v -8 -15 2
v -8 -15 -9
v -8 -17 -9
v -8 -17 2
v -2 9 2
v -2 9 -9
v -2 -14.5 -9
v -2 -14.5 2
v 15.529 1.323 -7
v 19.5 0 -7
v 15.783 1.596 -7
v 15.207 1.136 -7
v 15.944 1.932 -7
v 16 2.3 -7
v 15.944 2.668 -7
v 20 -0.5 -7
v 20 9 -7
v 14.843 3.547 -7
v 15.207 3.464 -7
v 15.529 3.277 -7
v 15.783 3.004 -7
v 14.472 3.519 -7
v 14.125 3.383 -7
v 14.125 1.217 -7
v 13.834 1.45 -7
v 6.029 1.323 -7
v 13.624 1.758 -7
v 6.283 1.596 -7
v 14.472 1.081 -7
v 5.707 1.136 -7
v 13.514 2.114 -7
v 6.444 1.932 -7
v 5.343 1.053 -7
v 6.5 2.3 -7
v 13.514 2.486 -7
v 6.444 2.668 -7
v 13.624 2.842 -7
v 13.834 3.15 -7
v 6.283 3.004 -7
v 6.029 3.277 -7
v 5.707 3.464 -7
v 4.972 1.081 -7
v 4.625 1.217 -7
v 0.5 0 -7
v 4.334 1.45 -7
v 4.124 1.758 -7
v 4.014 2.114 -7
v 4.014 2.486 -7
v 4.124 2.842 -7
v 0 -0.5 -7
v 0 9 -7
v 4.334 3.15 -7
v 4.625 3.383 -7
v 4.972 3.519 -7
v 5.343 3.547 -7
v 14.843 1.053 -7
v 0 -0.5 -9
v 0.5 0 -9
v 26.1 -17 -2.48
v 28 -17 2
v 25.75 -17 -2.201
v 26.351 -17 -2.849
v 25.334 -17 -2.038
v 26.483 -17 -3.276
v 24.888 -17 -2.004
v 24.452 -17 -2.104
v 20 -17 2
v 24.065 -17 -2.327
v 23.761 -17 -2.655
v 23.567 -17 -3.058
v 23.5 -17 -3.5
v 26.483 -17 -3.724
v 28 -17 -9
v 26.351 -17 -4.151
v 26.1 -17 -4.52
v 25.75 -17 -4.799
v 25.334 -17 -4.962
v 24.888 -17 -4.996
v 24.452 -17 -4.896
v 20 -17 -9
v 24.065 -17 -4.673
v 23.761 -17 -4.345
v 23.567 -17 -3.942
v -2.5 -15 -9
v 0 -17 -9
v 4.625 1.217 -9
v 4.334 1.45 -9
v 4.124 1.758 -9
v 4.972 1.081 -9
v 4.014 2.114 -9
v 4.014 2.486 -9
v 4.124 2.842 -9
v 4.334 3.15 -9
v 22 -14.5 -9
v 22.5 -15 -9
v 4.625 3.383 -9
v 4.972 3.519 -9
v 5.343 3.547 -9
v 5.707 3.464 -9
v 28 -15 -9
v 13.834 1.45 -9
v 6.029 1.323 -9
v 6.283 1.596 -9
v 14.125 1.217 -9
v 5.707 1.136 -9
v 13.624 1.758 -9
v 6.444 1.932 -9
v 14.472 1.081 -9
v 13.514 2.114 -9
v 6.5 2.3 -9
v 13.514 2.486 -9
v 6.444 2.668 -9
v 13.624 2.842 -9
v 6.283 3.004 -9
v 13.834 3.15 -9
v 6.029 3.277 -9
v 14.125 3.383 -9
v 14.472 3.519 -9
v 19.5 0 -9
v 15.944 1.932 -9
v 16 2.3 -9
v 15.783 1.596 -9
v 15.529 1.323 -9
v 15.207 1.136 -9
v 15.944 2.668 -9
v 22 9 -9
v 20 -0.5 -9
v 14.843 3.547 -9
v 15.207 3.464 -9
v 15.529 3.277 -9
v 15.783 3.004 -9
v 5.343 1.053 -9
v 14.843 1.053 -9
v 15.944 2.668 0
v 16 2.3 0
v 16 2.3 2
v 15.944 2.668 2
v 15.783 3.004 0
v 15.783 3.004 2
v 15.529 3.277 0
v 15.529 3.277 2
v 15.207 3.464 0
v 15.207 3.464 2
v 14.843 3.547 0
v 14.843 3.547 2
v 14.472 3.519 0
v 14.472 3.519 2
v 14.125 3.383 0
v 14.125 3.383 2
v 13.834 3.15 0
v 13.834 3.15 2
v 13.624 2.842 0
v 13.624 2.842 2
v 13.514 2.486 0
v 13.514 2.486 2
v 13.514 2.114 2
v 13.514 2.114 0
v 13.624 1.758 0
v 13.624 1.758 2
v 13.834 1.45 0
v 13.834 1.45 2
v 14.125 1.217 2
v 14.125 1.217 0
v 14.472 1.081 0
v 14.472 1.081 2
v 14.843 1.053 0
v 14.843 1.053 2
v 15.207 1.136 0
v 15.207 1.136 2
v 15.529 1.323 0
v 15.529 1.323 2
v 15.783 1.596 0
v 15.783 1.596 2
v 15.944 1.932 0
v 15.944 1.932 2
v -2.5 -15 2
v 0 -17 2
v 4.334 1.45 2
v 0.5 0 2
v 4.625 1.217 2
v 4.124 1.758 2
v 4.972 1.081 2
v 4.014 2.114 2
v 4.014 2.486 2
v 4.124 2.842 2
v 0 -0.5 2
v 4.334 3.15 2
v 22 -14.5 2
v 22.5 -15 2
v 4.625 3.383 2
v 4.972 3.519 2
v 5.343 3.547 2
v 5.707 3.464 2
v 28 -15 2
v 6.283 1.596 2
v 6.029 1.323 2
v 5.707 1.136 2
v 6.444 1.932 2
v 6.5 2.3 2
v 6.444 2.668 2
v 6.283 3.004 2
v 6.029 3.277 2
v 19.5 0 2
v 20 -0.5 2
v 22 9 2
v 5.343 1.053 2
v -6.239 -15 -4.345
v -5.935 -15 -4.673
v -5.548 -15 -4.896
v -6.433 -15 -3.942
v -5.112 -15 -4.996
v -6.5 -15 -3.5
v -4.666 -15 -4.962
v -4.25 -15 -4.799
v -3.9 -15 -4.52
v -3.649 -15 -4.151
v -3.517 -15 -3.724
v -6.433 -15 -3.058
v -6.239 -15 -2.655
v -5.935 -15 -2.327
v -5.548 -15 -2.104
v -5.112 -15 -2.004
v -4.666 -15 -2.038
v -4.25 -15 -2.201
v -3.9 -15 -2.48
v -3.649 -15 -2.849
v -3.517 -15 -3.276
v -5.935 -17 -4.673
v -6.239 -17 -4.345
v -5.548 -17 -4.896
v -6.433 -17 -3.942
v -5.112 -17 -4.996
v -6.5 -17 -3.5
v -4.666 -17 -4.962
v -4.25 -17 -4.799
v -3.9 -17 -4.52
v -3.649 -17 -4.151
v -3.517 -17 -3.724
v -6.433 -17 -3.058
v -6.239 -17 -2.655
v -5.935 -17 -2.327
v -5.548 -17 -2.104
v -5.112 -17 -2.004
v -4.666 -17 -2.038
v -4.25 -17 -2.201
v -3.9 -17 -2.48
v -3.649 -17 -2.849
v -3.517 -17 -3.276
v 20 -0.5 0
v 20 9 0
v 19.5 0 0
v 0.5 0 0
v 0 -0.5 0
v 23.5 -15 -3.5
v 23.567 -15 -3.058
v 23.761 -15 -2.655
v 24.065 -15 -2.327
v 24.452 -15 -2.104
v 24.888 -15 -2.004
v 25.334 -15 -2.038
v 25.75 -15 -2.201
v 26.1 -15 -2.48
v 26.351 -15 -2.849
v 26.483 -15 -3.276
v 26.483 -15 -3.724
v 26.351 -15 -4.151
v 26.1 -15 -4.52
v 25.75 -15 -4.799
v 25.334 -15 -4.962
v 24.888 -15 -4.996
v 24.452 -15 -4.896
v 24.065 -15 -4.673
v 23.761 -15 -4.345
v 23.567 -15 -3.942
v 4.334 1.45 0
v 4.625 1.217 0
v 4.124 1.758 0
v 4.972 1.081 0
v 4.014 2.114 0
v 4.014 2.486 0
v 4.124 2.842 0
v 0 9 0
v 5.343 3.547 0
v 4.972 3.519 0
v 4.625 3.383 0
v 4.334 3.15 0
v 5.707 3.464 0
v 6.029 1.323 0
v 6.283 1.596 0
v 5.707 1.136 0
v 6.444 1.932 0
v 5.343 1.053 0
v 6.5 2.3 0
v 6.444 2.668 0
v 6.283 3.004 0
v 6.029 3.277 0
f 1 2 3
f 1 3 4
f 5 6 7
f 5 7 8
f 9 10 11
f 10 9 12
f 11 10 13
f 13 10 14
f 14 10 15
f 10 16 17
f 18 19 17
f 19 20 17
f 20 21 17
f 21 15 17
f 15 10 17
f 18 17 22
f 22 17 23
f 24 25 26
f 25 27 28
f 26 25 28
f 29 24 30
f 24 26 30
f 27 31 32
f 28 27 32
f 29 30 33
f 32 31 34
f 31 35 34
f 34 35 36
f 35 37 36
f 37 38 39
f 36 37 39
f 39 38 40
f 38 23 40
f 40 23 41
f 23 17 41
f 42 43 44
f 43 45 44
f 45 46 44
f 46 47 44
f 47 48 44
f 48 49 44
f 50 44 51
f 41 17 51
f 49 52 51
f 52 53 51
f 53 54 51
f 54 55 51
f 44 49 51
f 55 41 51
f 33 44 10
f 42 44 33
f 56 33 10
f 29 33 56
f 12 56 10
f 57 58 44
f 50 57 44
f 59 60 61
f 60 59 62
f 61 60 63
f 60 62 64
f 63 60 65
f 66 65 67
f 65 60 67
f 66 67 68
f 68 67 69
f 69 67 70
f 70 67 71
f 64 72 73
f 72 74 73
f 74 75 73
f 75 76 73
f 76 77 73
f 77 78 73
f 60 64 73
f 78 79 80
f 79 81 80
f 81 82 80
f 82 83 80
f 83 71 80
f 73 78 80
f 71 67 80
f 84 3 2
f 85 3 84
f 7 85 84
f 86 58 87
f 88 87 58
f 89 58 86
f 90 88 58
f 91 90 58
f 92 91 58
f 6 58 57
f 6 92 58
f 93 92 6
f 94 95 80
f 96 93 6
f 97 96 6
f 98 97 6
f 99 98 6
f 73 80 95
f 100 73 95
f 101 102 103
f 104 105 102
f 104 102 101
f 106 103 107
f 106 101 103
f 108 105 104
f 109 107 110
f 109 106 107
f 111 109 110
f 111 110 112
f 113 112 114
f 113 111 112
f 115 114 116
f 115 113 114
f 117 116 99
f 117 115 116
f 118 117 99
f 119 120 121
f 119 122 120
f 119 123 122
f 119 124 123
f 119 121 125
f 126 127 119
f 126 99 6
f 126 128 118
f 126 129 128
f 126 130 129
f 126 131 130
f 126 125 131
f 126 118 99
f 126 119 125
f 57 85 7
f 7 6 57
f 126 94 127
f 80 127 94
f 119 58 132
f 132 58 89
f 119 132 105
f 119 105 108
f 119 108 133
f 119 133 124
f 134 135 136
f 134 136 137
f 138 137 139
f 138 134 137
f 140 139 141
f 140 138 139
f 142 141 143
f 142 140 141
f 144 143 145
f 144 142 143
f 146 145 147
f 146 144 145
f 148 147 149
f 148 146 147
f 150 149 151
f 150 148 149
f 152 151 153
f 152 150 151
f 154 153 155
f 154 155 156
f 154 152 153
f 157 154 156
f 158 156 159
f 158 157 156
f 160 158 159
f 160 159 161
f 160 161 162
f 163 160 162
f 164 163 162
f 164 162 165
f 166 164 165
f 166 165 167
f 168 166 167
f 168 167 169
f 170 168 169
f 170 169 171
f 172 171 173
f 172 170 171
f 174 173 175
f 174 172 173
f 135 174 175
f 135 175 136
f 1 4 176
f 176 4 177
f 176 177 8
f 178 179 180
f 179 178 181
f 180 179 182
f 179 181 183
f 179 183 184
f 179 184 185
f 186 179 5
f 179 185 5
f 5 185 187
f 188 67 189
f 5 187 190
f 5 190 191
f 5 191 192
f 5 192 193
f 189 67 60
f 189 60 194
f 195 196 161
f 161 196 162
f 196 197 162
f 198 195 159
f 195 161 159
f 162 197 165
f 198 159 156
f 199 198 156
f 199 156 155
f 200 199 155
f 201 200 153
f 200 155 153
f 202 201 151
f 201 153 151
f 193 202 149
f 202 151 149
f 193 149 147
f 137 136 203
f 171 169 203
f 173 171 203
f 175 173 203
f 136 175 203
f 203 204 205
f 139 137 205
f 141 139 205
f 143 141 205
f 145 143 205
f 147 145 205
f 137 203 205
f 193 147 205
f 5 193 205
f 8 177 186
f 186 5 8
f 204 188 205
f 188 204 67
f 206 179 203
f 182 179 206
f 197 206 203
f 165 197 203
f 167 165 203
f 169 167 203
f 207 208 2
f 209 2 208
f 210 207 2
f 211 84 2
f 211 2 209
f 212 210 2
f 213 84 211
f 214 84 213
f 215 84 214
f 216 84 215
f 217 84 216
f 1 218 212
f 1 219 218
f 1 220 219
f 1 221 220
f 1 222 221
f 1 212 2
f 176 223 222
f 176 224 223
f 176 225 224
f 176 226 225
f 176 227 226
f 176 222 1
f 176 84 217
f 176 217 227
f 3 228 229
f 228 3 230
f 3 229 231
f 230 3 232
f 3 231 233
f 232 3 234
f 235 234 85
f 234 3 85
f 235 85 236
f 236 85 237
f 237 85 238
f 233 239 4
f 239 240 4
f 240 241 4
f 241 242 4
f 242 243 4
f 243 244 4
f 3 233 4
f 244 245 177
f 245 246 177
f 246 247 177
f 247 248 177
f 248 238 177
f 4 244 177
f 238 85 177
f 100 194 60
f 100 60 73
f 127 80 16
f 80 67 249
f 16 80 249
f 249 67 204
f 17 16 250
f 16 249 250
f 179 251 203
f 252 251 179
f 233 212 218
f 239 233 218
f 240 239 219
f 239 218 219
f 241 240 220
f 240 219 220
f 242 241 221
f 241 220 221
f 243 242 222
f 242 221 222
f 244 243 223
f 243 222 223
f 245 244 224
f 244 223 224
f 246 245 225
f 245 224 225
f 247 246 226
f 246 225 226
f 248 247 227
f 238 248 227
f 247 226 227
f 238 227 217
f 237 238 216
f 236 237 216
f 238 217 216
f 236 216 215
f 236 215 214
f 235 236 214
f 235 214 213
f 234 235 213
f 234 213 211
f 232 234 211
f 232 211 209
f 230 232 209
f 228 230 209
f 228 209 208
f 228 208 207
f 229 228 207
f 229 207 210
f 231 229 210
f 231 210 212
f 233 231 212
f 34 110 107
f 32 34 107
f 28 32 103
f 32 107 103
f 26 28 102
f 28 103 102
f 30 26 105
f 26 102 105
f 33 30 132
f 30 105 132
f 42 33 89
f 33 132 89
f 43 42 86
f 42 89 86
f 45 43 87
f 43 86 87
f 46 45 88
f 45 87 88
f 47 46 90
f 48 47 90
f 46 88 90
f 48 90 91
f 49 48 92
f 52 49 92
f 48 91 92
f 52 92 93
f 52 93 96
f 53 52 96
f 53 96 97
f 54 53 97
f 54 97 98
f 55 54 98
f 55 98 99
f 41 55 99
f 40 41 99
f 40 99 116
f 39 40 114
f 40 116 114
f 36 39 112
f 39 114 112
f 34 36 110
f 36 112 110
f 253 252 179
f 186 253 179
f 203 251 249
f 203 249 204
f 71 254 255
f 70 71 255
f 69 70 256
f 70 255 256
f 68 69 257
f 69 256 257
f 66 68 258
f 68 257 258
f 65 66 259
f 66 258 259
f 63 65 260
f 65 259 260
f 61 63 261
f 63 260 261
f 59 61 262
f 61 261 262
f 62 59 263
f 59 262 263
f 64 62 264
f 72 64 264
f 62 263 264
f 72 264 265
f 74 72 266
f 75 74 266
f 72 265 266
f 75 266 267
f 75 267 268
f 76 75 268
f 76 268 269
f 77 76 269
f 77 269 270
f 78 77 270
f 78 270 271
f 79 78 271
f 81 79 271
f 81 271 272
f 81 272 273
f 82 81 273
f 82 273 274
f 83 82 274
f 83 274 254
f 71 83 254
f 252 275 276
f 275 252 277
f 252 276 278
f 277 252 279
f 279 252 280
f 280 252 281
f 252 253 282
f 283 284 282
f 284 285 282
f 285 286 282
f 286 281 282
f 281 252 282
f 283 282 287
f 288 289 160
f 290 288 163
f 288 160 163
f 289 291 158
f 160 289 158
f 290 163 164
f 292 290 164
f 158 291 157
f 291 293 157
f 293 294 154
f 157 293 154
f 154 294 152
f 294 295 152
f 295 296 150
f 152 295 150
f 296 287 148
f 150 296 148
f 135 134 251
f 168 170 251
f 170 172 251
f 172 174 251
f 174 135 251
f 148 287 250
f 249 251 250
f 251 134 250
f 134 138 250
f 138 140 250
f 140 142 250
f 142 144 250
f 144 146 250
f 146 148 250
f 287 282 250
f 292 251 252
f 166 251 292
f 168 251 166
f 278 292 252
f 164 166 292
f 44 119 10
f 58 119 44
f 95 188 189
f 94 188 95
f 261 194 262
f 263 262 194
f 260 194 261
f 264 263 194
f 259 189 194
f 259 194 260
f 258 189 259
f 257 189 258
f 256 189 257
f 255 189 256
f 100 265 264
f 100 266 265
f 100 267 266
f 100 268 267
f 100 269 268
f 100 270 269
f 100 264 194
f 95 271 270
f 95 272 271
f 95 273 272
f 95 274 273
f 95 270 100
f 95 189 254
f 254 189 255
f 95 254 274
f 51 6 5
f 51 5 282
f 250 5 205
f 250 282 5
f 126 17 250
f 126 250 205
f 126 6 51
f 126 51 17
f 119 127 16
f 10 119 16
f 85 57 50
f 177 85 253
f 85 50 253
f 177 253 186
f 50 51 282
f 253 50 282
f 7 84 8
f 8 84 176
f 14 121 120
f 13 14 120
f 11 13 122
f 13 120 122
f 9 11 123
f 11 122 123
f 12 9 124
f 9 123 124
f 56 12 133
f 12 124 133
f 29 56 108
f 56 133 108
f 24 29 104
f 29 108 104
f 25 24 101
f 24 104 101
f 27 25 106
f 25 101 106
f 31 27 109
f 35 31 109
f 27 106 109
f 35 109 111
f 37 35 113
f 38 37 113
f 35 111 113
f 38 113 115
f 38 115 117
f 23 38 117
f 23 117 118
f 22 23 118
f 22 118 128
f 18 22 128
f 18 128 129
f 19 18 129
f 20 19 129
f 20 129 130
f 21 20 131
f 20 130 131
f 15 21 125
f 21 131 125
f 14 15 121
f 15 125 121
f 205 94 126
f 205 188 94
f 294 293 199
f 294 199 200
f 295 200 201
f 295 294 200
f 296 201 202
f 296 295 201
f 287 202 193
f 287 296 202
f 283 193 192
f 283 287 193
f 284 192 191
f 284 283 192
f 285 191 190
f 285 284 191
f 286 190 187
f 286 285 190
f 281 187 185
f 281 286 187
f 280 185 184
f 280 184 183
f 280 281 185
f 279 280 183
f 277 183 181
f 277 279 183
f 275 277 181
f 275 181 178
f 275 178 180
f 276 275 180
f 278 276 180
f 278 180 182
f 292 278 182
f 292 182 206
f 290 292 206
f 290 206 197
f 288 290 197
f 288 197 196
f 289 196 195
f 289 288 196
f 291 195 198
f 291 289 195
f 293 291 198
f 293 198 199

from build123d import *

# Parameters (mm, degrees)
CROQUIS1_W              = 20
CROQUIS1_H              = 10
CROQUIS1_R              = 1.25
SALIENTE_EXTRUIR1_DEPTH = 2
CROQUIS2_W              = 2
CROQUIS2_H              = 10
SALIENTE_EXTRUIR2_DEPTH = 11
CROQUIS3_W              = 20
CROQUIS3_H              = 10
CROQUIS3_R              = 1.25
SALIENTE_EXTRUIR3_DEPTH = 2
CROQUIS4_W              = 2
CROQUIS4_H              = 11
SALIENTE_EXTRUIR4_DEPTH = 17
CROQUIS5_W              = 11
CROQUIS5_H              = 2
SALIENTE_EXTRUIR5_DEPTH = 6
CROQUIS6_W              = 11
CROQUIS6_H              = 2
SALIENTE_EXTRUIR6_DEPTH = 6
CROQUIS7_W              = 24
CROQUIS7_H              = 11
CROQUIS7_W_2            = 20
CROQUIS7_H_2            = 7
CORTAR_EXTRUIR1_DEPTH   = 1
CROQUIS8_R              = 1.5
CORTAR_EXTRUIR2_DEPTH   = 11
CHAFL_N1_SIZE           = 0.5


with BuildPart() as part:
    # Croquis1 → Saliente-Extruir1 (new body)
    with BuildSketch(Plane.XY):
        with Locations((10, 5)):
            Rectangle(CROQUIS1_W, CROQUIS1_H)
        with Locations((5.25, 2.3)):
            Circle(CROQUIS1_R, mode=Mode.SUBTRACT)
        with Locations((14.75, 2.3)):
            Circle(CROQUIS1_R, mode=Mode.SUBTRACT)
    extrude(amount=SALIENTE_EXTRUIR1_DEPTH)

    # Croquis2 → Saliente-Extruir2 (add)
    with BuildSketch(Plane.XY.offset(2)):
        with Locations((-1, 5)):
            Rectangle(CROQUIS2_W, CROQUIS2_H)
        with Locations((21, 5)):
            Rectangle(CROQUIS2_W, CROQUIS2_H)
    extrude(amount=-SALIENTE_EXTRUIR2_DEPTH)



with BuildPart() as body_2:
    # Croquis3 → Saliente-Extruir3 (new body)
    with BuildSketch(Plane(origin=(0, 0, -9), x_dir=(-1, 0, 0), z_dir=(0, 0, -1))):
        with Locations((-10, 5)):
            Rectangle(CROQUIS3_W, CROQUIS3_H)
        with Locations(Location((-5.25, 2.3, 0), (0, 0, 180))):
            Circle(CROQUIS3_R, mode=Mode.SUBTRACT)
        with Locations(Location((-14.75, 2.3, 0), (0, 0, 180))):
            Circle(CROQUIS3_R, mode=Mode.SUBTRACT)
    extrude(amount=-SALIENTE_EXTRUIR3_DEPTH)


with BuildPart() as part_1:
    add(part.part)

    add(body_2.part)  # Saliente-Extruir4 merges body 2
    # Croquis4 → Saliente-Extruir4 (add)
    with BuildSketch(Plane.XZ):
        with Locations((-1, -3.5)):
            Rectangle(CROQUIS4_W, CROQUIS4_H)
        with Locations((21, -3.5)):
            Rectangle(CROQUIS4_W, CROQUIS4_H)
    extrude(amount=SALIENTE_EXTRUIR4_DEPTH)

    # Croquis5 → Saliente-Extruir5 (add)
    with BuildSketch(Plane(origin=(22, 0, 0), x_dir=(0, 0, -1), z_dir=(1, 0, 0))):
        with Locations((3.5, -16)):
            Rectangle(CROQUIS5_W, CROQUIS5_H)
    extrude(amount=SALIENTE_EXTRUIR5_DEPTH)

    # Croquis6 → Saliente-Extruir6 (add)
    with BuildSketch(Plane.ZY.offset(2)):
        with Locations((-3.5, -16)):
            Rectangle(CROQUIS6_W, CROQUIS6_H)
    extrude(amount=SALIENTE_EXTRUIR6_DEPTH)

    # Croquis7 → Cortar-Extruir1 (cut)
    with BuildSketch(Plane(origin=(0, 10, 0), x_dir=(1, 0, 0), z_dir=(0, 1, 0))):
        with Locations((10, 3.5)):
            Rectangle(CROQUIS7_W, CROQUIS7_H)
        with Locations((10, 3.5)):
            Rectangle(CROQUIS7_W_2, CROQUIS7_H_2, mode=Mode.SUBTRACT)
    extrude(amount=-CORTAR_EXTRUIR1_DEPTH, mode=Mode.SUBTRACT)

    # Croquis8 → Cortar-Extruir2 (cut)
    with BuildSketch(Plane(origin=(0, -15, 0), x_dir=(1, 0, 0), z_dir=(0, 1, 0))):
        with Locations(Location((-5, 3.5, 0), (0, 0, 180))):
            Circle(CROQUIS8_R)
        with Locations(Location((25, 3.5, 0), (0, 0, 180))):
            Circle(CROQUIS8_R)
    extrude(amount=-CORTAR_EXTRUIR2_DEPTH, mode=Mode.SUBTRACT)

    # Chaflán1
    chafl_n1_edges = [part_1.edges().sort_by_distance(p)[0] for p in [
        (-2, -15, -3.5),
        (0, 0, 1),
        (0, 0, -8),
        (20, 0, 1),
        (20, 0, -8),
        (22, -15, -3.5),
    ]]
    chamfer(chafl_n1_edges, length=CHAFL_N1_SIZE)


solid = part_1.part
